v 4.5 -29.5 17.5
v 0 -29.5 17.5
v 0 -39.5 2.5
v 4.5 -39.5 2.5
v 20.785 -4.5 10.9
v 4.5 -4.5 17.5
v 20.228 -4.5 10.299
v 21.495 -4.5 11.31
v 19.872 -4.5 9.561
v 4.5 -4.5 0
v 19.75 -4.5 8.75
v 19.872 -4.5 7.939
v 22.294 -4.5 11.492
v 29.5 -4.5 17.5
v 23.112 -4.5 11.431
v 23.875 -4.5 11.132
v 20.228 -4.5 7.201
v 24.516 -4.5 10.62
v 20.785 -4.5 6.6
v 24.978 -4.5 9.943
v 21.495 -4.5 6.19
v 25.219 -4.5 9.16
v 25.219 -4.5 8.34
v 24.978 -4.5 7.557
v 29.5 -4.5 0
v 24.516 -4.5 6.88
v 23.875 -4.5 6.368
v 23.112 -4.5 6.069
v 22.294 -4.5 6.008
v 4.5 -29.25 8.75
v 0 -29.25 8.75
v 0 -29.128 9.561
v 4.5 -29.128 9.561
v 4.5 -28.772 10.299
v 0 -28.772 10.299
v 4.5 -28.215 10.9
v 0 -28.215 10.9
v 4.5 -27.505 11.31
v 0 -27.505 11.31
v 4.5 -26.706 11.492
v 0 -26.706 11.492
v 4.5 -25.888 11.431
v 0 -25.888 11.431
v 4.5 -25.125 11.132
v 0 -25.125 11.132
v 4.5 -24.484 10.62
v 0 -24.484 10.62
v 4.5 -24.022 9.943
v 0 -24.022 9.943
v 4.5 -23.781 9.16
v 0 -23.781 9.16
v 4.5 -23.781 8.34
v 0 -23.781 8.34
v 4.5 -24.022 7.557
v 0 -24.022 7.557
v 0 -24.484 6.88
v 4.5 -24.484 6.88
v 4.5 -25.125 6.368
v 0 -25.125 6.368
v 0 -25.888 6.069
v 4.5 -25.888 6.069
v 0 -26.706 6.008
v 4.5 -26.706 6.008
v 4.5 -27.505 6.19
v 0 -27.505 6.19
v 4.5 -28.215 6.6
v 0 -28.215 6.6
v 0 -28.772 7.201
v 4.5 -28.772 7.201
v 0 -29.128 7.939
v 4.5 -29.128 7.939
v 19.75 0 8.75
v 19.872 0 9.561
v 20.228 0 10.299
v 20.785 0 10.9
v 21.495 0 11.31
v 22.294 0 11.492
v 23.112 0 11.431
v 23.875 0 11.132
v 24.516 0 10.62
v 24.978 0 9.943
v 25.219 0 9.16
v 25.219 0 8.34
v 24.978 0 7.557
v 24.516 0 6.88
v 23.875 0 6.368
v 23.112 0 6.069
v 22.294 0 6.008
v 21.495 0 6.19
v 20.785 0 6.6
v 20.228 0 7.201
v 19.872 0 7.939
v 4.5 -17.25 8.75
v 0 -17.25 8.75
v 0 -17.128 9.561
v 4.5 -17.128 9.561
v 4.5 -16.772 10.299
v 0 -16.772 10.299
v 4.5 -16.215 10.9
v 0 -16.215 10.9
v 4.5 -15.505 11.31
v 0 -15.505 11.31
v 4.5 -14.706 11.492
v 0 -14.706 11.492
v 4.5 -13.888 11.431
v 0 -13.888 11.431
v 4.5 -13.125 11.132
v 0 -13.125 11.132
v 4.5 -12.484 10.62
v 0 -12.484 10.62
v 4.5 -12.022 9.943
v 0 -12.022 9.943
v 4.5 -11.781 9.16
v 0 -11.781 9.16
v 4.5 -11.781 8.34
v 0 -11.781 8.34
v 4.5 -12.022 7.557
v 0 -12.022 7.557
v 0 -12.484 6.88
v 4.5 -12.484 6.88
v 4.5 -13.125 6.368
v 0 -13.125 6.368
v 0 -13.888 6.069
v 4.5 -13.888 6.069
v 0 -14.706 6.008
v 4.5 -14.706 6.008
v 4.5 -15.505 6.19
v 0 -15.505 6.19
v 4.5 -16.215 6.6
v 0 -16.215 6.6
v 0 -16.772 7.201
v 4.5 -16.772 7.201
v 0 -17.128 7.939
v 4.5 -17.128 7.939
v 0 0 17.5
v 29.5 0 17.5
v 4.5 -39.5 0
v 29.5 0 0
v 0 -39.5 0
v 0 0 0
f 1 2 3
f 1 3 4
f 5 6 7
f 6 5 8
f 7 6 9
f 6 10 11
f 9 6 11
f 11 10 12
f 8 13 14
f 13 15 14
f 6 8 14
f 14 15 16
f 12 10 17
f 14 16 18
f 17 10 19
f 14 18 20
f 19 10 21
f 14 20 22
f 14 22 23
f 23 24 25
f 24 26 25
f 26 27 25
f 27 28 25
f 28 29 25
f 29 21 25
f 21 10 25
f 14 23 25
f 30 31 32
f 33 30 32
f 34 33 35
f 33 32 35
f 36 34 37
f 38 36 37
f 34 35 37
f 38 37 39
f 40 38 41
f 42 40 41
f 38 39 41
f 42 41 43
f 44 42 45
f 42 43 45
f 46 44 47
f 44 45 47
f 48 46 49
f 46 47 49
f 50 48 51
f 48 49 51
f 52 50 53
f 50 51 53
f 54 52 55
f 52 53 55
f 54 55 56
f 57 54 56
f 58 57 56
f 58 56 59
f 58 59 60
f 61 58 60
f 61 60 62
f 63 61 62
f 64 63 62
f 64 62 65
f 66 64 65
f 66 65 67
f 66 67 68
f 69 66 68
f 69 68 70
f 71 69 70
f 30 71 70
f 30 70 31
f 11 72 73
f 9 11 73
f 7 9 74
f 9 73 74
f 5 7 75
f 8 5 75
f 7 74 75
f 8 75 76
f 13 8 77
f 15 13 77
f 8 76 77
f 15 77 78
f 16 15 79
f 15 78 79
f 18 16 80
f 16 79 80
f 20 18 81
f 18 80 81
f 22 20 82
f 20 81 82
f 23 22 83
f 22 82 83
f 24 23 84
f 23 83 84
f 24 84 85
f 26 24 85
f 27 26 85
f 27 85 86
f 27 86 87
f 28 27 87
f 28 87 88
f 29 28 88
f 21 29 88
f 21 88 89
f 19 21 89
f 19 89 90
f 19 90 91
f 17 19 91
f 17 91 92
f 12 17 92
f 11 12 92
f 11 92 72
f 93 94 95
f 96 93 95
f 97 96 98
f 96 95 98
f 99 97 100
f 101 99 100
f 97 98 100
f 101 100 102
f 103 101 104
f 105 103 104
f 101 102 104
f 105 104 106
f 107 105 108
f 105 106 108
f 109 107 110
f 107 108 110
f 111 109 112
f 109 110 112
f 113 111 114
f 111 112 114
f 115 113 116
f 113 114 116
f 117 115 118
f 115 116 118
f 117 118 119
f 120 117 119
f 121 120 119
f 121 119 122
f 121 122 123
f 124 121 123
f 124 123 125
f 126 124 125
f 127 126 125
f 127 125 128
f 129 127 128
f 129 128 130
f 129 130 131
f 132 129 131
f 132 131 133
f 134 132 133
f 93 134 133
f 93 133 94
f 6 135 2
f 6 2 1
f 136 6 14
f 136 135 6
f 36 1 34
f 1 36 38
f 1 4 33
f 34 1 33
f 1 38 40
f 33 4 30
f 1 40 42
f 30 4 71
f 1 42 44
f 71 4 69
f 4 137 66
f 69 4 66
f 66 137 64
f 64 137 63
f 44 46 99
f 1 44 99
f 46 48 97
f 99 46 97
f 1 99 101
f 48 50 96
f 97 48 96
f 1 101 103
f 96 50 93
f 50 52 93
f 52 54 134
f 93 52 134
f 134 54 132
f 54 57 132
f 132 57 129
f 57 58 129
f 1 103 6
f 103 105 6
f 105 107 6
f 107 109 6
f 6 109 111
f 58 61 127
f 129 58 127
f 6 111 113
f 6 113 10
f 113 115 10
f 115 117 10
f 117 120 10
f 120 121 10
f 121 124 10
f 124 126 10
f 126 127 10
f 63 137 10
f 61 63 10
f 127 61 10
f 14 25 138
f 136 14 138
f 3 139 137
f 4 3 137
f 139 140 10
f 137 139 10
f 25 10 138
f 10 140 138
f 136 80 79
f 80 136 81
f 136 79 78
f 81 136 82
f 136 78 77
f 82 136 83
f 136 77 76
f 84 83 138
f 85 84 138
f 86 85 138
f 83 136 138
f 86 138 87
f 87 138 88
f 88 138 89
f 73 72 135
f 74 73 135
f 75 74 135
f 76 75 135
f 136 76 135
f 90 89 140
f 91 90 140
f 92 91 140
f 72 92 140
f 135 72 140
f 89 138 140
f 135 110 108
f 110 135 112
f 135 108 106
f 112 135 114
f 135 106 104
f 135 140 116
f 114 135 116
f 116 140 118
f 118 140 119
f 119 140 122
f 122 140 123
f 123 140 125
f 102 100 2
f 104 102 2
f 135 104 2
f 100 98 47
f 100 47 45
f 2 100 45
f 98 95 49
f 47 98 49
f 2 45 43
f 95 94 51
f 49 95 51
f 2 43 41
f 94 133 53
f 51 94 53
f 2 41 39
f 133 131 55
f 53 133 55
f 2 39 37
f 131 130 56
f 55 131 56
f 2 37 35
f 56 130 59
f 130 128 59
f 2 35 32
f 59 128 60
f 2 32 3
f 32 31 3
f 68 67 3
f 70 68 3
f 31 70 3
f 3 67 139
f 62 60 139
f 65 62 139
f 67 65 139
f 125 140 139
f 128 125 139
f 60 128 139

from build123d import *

# Parameters (mm, degrees)
F1_DEPTH = 17.5
F3_D     = 5.5
F4_SIZE2 = 10
F4_SIZE  = 15
F6_D     = 5.5


with BuildPart() as f1:
    # F0 (on Top) → F1 (new body)
    with BuildSketch(Plane.XY):
        Polygon((29.5, 0), (0, 0), (0, -39.5), (4.5, -39.5), (4.5, -4.5), (29.5, -4.5), align=None)
    extrude(amount=F1_DEPTH)

    # F3 (through all)
    with Locations(Plane.XZ.offset(4.5)):
        with Locations((22.5, 8.75)):
            Hole(F3_D / 2)

    # F4
    f4_edges = [f1.edges().sort_by_distance(p)[0] for p in [
        (2.25, -39.5, 17.5),
    ]]
    f4_side = f1.faces().sort_by_distance((2.25, -39.5, 8.75))[0]
    chamfer(f4_edges, length=F4_SIZE, length2=F4_SIZE2, reference=f4_side)

    # F6 (through all)
    with Locations(Plane.YZ.offset(4.5)):
        with Locations((-14.5, 8.75), (-26.5, 8.75)):
            Hole(F6_D / 2)


solid = f1.part
